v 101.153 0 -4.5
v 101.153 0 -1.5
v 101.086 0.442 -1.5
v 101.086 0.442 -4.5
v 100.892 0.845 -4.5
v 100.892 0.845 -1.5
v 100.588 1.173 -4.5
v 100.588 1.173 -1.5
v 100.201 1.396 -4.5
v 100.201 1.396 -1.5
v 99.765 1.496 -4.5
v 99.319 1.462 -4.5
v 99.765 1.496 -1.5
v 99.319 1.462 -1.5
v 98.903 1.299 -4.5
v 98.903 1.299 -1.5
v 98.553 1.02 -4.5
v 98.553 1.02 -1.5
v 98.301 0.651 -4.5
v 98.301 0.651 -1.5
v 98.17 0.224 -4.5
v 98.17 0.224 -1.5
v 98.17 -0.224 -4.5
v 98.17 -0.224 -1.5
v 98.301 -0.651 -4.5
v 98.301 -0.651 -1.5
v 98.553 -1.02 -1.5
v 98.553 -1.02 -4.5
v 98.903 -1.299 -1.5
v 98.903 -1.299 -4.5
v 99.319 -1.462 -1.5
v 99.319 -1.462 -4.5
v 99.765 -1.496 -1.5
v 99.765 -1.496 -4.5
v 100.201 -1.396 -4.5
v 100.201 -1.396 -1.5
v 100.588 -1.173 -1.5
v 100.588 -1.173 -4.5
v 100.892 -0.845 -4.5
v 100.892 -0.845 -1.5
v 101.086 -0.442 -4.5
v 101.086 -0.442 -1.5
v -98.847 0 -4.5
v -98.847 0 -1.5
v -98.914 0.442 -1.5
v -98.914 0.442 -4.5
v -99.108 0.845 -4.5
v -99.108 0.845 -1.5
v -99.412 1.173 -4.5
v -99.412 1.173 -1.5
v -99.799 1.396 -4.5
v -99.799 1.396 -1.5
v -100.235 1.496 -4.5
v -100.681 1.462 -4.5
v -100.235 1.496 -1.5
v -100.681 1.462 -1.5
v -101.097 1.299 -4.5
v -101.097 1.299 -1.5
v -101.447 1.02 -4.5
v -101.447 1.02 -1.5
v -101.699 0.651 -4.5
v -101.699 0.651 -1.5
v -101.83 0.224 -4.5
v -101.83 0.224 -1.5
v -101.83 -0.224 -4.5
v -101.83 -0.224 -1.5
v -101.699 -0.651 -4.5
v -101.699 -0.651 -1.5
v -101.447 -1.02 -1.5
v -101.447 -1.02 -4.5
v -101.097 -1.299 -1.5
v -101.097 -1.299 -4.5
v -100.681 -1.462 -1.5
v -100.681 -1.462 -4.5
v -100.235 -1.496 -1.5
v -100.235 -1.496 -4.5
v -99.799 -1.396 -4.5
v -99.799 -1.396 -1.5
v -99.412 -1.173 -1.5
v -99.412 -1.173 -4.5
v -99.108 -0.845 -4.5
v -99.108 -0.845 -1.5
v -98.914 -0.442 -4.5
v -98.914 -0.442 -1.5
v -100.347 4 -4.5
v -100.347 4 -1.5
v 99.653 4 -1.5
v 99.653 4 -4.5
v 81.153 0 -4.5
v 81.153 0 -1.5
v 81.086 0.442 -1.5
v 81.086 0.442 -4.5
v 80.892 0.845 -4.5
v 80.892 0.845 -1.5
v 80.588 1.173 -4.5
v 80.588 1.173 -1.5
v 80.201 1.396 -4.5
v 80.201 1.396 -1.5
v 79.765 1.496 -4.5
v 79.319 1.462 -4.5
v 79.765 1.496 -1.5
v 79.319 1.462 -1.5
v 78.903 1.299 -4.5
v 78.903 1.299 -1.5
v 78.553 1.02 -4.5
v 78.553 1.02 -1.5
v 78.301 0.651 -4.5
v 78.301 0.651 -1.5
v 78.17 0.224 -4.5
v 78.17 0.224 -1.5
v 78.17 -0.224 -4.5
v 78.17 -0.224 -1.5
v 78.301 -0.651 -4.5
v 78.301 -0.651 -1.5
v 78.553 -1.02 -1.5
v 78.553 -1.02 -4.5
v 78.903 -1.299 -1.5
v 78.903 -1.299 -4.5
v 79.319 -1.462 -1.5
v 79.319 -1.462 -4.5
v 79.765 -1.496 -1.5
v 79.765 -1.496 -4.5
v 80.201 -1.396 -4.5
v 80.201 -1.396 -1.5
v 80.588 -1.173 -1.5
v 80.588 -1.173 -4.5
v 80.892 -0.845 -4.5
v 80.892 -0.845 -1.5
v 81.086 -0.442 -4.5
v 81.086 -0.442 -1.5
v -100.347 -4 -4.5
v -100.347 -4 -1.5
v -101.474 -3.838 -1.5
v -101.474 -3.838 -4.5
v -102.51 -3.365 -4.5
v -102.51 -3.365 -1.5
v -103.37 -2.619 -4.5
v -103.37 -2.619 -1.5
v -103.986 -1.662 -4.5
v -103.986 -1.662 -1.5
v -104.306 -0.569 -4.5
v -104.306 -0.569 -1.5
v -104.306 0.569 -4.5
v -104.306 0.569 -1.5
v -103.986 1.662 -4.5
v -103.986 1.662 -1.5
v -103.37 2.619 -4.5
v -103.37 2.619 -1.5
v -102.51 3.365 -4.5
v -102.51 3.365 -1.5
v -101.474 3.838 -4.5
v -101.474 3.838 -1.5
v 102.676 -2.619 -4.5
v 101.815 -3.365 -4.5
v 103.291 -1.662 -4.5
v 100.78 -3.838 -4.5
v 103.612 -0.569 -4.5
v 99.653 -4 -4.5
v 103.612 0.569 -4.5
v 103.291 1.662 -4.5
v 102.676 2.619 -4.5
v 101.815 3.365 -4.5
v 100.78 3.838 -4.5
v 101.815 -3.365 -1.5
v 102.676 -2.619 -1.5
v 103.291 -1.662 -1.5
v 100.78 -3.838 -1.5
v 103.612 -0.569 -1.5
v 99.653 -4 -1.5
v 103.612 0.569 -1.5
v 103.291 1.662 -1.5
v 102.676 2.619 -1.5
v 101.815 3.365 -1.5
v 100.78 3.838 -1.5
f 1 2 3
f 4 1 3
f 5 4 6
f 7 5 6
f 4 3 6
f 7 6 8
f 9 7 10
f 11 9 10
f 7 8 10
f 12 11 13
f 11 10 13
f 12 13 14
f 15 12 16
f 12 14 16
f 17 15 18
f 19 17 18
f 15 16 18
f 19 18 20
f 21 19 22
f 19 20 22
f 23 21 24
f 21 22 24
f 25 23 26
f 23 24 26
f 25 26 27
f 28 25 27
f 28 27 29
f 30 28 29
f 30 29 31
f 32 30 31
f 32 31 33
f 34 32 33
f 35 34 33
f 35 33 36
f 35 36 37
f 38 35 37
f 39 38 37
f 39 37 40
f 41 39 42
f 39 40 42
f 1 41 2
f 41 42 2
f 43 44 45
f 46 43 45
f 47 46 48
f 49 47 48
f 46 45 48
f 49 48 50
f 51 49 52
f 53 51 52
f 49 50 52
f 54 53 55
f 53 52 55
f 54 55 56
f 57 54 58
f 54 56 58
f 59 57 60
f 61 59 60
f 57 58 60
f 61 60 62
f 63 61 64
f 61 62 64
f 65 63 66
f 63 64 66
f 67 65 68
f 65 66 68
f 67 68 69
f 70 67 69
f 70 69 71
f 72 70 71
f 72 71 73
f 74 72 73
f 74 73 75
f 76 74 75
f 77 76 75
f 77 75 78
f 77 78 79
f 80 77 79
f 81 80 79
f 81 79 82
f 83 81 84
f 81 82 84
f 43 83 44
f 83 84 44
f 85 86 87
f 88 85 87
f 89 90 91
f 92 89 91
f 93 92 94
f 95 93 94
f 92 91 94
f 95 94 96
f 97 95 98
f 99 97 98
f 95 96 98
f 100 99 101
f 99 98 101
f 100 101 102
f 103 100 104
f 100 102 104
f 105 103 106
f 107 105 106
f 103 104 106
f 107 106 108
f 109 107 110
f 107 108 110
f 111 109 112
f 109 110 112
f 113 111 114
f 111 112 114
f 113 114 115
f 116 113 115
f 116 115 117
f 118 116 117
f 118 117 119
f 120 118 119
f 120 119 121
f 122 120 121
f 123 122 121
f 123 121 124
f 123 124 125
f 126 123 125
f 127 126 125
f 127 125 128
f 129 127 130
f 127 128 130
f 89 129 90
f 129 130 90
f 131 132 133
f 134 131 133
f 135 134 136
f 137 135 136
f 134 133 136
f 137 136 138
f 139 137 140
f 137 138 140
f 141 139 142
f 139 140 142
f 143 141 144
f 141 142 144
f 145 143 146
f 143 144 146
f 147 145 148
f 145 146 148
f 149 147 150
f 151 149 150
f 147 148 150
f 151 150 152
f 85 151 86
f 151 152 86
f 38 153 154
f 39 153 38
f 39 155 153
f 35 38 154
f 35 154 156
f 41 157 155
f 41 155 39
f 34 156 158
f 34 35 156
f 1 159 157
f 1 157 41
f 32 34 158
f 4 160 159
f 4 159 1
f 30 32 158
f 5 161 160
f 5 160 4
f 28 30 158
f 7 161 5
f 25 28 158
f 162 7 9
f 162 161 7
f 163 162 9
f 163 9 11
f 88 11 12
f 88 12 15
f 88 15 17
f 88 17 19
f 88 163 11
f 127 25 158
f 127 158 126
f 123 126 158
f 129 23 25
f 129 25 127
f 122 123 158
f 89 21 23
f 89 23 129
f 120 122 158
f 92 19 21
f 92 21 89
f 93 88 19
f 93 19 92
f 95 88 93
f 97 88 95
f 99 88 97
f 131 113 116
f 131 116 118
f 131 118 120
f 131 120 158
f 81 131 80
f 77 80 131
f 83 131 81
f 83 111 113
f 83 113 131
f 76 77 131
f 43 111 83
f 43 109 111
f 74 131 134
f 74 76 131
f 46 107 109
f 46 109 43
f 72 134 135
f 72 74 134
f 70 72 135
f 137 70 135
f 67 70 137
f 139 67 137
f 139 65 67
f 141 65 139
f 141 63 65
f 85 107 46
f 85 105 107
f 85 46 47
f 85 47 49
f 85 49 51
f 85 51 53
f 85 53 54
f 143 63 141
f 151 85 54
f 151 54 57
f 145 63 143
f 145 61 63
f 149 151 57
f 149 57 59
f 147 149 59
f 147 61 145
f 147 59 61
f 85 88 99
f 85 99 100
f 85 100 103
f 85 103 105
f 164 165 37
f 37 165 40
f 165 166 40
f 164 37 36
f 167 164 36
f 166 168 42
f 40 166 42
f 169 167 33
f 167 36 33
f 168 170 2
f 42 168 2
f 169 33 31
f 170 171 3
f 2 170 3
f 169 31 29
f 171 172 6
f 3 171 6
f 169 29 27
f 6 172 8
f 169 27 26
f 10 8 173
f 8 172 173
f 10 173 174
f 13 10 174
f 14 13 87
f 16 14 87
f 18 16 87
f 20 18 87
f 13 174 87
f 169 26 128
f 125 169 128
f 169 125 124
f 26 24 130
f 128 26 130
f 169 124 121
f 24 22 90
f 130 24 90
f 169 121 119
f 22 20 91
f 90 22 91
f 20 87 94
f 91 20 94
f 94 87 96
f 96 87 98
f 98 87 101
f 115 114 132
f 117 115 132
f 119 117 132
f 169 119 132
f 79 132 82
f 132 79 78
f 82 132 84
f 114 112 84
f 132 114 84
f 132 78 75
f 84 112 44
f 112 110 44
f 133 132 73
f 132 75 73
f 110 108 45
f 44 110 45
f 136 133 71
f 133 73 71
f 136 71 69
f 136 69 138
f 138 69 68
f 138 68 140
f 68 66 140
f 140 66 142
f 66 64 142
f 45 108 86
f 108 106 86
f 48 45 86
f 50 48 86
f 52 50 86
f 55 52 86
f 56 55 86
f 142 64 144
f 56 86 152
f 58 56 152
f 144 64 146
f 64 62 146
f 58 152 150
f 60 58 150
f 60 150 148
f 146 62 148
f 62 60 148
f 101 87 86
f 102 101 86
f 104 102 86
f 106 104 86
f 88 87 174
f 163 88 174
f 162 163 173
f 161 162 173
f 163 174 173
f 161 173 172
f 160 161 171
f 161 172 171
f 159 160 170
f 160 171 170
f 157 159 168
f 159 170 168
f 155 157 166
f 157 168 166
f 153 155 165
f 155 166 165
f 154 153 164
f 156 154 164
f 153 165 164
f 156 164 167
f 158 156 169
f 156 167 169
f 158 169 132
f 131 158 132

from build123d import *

# Parameters (mm, degrees)
SKETCH1_R           = 3
BOSS_EXTRUDE1_DEPTH = 6
SCALE1_SCALE        = 0.5


with BuildPart() as part:
    # Sketch1 → Boss-Extrude1 (new body)
    with BuildSketch(Plane.XY):
        with BuildLine():
            Line((-200, 8), (200, 8))
            ThreePointArc((200, 8), (208, 0), (200, -8))
            Line((200, -8), (-200, -8))
            ThreePointArc((-200, -8), (-208, 0), (-200, 8))
        make_face()
        with Locations((-200, 0)):
            Circle(SKETCH1_R, mode=Mode.SUBTRACT)
        with Locations((200, 0)):
            Circle(SKETCH1_R, mode=Mode.SUBTRACT)
        with Locations((160, 0)):
            Circle(SKETCH1_R, mode=Mode.SUBTRACT)
    extrude(amount=-BOSS_EXTRUDE1_DEPTH)


with BuildPart() as part_1:
    # Scale1: scaled about (-0.694249163, 0, -3)
    add(part.part.scale(SCALE1_SCALE).moved(Location((-0.347124581, 0, -1.5))))


solid = part_1.part
